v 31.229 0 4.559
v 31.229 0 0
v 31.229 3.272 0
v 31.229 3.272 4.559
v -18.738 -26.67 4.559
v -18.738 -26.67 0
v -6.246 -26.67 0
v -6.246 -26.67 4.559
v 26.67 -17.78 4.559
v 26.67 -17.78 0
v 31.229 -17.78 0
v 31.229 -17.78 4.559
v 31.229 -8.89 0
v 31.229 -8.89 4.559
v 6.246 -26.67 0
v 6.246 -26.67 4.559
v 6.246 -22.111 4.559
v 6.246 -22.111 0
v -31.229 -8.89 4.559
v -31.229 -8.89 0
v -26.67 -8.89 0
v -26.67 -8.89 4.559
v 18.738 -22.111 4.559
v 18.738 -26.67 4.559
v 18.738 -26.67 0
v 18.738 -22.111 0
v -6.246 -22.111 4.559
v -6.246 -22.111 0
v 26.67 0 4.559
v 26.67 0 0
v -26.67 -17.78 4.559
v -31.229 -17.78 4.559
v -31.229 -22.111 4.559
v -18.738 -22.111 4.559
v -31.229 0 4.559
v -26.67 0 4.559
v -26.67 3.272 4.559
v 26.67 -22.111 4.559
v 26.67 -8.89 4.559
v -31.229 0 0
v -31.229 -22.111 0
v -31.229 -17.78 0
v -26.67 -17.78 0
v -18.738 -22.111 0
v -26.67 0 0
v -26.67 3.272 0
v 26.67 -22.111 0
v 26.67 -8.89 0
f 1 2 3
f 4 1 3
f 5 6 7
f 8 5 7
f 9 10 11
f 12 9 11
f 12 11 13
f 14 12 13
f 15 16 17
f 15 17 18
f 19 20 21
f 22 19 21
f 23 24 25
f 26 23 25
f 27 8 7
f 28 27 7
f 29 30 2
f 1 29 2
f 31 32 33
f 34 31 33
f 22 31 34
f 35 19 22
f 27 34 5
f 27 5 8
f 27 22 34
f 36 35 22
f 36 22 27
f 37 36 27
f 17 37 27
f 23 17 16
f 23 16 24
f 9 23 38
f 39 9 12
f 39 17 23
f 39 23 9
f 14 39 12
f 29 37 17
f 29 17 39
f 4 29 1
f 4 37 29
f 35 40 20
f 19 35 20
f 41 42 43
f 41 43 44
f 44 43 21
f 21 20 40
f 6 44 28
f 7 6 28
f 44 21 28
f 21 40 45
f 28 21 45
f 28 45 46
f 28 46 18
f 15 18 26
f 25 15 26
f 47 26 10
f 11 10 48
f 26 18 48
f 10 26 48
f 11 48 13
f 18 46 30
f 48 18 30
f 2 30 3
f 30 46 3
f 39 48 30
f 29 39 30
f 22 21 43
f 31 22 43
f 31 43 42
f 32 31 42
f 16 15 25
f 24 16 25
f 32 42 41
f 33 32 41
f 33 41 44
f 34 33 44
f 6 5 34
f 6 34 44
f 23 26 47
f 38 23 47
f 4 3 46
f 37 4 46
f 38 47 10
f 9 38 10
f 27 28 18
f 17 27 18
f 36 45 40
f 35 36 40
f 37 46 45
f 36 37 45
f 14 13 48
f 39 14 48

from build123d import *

# Parameters (mm, degrees)
BOSS_EXTRUDE1_DEPTH = 4.5593
CAVITY1_START       = -26.67
CAVITY1_OUTLINE_W   = 12.49172
CAVITY1_OUTLINE_H   = 4.5593
CAVITY1_OUTLINE_W_2 = 7.93242
CAVITY1_DEPTH       = 4.5593


# Read off the part's stored shape, not the designer's step: Cavity1
with BuildPart() as part:
    # Sketch1 → Boss-Extrude1 (new body)
    with BuildSketch(Plane.XY):
        Polygon((31.2293, 0), (31.2293, 3.27152), (-26.67, 3.27152), (-26.67, 0), (-31.2293, 0), (-31.2293, -8.89), (-26.67, -8.89), (-26.67, -17.78), (-31.2293, -17.78), (-31.2293, -26.67), (26.67, -26.67), (26.67, -17.78), (31.2293, -17.78), (31.2293, -8.89), (26.67, -8.89), (26.67, 0), align=None)
    extrude(amount=BOSS_EXTRUDE1_DEPTH)

    # Cavity1 outline → Cavity1 (cut)
    with BuildSketch(Plane(origin=(0, 0, 0), x_dir=(1, 0, 0), z_dir=(0, 1, 0)).offset(CAVITY1_START)):
        with Locations((-24.98344, -2.27965)):
            Rectangle(CAVITY1_OUTLINE_W, CAVITY1_OUTLINE_H)
        with Locations((0, -2.27965)):
            Rectangle(CAVITY1_OUTLINE_W, CAVITY1_OUTLINE_H)
        with Locations((22.70379, -2.27965)):
            Rectangle(CAVITY1_OUTLINE_W_2, CAVITY1_OUTLINE_H)
    extrude(amount=CAVITY1_DEPTH, mode=Mode.SUBTRACT)


solid = part.part
